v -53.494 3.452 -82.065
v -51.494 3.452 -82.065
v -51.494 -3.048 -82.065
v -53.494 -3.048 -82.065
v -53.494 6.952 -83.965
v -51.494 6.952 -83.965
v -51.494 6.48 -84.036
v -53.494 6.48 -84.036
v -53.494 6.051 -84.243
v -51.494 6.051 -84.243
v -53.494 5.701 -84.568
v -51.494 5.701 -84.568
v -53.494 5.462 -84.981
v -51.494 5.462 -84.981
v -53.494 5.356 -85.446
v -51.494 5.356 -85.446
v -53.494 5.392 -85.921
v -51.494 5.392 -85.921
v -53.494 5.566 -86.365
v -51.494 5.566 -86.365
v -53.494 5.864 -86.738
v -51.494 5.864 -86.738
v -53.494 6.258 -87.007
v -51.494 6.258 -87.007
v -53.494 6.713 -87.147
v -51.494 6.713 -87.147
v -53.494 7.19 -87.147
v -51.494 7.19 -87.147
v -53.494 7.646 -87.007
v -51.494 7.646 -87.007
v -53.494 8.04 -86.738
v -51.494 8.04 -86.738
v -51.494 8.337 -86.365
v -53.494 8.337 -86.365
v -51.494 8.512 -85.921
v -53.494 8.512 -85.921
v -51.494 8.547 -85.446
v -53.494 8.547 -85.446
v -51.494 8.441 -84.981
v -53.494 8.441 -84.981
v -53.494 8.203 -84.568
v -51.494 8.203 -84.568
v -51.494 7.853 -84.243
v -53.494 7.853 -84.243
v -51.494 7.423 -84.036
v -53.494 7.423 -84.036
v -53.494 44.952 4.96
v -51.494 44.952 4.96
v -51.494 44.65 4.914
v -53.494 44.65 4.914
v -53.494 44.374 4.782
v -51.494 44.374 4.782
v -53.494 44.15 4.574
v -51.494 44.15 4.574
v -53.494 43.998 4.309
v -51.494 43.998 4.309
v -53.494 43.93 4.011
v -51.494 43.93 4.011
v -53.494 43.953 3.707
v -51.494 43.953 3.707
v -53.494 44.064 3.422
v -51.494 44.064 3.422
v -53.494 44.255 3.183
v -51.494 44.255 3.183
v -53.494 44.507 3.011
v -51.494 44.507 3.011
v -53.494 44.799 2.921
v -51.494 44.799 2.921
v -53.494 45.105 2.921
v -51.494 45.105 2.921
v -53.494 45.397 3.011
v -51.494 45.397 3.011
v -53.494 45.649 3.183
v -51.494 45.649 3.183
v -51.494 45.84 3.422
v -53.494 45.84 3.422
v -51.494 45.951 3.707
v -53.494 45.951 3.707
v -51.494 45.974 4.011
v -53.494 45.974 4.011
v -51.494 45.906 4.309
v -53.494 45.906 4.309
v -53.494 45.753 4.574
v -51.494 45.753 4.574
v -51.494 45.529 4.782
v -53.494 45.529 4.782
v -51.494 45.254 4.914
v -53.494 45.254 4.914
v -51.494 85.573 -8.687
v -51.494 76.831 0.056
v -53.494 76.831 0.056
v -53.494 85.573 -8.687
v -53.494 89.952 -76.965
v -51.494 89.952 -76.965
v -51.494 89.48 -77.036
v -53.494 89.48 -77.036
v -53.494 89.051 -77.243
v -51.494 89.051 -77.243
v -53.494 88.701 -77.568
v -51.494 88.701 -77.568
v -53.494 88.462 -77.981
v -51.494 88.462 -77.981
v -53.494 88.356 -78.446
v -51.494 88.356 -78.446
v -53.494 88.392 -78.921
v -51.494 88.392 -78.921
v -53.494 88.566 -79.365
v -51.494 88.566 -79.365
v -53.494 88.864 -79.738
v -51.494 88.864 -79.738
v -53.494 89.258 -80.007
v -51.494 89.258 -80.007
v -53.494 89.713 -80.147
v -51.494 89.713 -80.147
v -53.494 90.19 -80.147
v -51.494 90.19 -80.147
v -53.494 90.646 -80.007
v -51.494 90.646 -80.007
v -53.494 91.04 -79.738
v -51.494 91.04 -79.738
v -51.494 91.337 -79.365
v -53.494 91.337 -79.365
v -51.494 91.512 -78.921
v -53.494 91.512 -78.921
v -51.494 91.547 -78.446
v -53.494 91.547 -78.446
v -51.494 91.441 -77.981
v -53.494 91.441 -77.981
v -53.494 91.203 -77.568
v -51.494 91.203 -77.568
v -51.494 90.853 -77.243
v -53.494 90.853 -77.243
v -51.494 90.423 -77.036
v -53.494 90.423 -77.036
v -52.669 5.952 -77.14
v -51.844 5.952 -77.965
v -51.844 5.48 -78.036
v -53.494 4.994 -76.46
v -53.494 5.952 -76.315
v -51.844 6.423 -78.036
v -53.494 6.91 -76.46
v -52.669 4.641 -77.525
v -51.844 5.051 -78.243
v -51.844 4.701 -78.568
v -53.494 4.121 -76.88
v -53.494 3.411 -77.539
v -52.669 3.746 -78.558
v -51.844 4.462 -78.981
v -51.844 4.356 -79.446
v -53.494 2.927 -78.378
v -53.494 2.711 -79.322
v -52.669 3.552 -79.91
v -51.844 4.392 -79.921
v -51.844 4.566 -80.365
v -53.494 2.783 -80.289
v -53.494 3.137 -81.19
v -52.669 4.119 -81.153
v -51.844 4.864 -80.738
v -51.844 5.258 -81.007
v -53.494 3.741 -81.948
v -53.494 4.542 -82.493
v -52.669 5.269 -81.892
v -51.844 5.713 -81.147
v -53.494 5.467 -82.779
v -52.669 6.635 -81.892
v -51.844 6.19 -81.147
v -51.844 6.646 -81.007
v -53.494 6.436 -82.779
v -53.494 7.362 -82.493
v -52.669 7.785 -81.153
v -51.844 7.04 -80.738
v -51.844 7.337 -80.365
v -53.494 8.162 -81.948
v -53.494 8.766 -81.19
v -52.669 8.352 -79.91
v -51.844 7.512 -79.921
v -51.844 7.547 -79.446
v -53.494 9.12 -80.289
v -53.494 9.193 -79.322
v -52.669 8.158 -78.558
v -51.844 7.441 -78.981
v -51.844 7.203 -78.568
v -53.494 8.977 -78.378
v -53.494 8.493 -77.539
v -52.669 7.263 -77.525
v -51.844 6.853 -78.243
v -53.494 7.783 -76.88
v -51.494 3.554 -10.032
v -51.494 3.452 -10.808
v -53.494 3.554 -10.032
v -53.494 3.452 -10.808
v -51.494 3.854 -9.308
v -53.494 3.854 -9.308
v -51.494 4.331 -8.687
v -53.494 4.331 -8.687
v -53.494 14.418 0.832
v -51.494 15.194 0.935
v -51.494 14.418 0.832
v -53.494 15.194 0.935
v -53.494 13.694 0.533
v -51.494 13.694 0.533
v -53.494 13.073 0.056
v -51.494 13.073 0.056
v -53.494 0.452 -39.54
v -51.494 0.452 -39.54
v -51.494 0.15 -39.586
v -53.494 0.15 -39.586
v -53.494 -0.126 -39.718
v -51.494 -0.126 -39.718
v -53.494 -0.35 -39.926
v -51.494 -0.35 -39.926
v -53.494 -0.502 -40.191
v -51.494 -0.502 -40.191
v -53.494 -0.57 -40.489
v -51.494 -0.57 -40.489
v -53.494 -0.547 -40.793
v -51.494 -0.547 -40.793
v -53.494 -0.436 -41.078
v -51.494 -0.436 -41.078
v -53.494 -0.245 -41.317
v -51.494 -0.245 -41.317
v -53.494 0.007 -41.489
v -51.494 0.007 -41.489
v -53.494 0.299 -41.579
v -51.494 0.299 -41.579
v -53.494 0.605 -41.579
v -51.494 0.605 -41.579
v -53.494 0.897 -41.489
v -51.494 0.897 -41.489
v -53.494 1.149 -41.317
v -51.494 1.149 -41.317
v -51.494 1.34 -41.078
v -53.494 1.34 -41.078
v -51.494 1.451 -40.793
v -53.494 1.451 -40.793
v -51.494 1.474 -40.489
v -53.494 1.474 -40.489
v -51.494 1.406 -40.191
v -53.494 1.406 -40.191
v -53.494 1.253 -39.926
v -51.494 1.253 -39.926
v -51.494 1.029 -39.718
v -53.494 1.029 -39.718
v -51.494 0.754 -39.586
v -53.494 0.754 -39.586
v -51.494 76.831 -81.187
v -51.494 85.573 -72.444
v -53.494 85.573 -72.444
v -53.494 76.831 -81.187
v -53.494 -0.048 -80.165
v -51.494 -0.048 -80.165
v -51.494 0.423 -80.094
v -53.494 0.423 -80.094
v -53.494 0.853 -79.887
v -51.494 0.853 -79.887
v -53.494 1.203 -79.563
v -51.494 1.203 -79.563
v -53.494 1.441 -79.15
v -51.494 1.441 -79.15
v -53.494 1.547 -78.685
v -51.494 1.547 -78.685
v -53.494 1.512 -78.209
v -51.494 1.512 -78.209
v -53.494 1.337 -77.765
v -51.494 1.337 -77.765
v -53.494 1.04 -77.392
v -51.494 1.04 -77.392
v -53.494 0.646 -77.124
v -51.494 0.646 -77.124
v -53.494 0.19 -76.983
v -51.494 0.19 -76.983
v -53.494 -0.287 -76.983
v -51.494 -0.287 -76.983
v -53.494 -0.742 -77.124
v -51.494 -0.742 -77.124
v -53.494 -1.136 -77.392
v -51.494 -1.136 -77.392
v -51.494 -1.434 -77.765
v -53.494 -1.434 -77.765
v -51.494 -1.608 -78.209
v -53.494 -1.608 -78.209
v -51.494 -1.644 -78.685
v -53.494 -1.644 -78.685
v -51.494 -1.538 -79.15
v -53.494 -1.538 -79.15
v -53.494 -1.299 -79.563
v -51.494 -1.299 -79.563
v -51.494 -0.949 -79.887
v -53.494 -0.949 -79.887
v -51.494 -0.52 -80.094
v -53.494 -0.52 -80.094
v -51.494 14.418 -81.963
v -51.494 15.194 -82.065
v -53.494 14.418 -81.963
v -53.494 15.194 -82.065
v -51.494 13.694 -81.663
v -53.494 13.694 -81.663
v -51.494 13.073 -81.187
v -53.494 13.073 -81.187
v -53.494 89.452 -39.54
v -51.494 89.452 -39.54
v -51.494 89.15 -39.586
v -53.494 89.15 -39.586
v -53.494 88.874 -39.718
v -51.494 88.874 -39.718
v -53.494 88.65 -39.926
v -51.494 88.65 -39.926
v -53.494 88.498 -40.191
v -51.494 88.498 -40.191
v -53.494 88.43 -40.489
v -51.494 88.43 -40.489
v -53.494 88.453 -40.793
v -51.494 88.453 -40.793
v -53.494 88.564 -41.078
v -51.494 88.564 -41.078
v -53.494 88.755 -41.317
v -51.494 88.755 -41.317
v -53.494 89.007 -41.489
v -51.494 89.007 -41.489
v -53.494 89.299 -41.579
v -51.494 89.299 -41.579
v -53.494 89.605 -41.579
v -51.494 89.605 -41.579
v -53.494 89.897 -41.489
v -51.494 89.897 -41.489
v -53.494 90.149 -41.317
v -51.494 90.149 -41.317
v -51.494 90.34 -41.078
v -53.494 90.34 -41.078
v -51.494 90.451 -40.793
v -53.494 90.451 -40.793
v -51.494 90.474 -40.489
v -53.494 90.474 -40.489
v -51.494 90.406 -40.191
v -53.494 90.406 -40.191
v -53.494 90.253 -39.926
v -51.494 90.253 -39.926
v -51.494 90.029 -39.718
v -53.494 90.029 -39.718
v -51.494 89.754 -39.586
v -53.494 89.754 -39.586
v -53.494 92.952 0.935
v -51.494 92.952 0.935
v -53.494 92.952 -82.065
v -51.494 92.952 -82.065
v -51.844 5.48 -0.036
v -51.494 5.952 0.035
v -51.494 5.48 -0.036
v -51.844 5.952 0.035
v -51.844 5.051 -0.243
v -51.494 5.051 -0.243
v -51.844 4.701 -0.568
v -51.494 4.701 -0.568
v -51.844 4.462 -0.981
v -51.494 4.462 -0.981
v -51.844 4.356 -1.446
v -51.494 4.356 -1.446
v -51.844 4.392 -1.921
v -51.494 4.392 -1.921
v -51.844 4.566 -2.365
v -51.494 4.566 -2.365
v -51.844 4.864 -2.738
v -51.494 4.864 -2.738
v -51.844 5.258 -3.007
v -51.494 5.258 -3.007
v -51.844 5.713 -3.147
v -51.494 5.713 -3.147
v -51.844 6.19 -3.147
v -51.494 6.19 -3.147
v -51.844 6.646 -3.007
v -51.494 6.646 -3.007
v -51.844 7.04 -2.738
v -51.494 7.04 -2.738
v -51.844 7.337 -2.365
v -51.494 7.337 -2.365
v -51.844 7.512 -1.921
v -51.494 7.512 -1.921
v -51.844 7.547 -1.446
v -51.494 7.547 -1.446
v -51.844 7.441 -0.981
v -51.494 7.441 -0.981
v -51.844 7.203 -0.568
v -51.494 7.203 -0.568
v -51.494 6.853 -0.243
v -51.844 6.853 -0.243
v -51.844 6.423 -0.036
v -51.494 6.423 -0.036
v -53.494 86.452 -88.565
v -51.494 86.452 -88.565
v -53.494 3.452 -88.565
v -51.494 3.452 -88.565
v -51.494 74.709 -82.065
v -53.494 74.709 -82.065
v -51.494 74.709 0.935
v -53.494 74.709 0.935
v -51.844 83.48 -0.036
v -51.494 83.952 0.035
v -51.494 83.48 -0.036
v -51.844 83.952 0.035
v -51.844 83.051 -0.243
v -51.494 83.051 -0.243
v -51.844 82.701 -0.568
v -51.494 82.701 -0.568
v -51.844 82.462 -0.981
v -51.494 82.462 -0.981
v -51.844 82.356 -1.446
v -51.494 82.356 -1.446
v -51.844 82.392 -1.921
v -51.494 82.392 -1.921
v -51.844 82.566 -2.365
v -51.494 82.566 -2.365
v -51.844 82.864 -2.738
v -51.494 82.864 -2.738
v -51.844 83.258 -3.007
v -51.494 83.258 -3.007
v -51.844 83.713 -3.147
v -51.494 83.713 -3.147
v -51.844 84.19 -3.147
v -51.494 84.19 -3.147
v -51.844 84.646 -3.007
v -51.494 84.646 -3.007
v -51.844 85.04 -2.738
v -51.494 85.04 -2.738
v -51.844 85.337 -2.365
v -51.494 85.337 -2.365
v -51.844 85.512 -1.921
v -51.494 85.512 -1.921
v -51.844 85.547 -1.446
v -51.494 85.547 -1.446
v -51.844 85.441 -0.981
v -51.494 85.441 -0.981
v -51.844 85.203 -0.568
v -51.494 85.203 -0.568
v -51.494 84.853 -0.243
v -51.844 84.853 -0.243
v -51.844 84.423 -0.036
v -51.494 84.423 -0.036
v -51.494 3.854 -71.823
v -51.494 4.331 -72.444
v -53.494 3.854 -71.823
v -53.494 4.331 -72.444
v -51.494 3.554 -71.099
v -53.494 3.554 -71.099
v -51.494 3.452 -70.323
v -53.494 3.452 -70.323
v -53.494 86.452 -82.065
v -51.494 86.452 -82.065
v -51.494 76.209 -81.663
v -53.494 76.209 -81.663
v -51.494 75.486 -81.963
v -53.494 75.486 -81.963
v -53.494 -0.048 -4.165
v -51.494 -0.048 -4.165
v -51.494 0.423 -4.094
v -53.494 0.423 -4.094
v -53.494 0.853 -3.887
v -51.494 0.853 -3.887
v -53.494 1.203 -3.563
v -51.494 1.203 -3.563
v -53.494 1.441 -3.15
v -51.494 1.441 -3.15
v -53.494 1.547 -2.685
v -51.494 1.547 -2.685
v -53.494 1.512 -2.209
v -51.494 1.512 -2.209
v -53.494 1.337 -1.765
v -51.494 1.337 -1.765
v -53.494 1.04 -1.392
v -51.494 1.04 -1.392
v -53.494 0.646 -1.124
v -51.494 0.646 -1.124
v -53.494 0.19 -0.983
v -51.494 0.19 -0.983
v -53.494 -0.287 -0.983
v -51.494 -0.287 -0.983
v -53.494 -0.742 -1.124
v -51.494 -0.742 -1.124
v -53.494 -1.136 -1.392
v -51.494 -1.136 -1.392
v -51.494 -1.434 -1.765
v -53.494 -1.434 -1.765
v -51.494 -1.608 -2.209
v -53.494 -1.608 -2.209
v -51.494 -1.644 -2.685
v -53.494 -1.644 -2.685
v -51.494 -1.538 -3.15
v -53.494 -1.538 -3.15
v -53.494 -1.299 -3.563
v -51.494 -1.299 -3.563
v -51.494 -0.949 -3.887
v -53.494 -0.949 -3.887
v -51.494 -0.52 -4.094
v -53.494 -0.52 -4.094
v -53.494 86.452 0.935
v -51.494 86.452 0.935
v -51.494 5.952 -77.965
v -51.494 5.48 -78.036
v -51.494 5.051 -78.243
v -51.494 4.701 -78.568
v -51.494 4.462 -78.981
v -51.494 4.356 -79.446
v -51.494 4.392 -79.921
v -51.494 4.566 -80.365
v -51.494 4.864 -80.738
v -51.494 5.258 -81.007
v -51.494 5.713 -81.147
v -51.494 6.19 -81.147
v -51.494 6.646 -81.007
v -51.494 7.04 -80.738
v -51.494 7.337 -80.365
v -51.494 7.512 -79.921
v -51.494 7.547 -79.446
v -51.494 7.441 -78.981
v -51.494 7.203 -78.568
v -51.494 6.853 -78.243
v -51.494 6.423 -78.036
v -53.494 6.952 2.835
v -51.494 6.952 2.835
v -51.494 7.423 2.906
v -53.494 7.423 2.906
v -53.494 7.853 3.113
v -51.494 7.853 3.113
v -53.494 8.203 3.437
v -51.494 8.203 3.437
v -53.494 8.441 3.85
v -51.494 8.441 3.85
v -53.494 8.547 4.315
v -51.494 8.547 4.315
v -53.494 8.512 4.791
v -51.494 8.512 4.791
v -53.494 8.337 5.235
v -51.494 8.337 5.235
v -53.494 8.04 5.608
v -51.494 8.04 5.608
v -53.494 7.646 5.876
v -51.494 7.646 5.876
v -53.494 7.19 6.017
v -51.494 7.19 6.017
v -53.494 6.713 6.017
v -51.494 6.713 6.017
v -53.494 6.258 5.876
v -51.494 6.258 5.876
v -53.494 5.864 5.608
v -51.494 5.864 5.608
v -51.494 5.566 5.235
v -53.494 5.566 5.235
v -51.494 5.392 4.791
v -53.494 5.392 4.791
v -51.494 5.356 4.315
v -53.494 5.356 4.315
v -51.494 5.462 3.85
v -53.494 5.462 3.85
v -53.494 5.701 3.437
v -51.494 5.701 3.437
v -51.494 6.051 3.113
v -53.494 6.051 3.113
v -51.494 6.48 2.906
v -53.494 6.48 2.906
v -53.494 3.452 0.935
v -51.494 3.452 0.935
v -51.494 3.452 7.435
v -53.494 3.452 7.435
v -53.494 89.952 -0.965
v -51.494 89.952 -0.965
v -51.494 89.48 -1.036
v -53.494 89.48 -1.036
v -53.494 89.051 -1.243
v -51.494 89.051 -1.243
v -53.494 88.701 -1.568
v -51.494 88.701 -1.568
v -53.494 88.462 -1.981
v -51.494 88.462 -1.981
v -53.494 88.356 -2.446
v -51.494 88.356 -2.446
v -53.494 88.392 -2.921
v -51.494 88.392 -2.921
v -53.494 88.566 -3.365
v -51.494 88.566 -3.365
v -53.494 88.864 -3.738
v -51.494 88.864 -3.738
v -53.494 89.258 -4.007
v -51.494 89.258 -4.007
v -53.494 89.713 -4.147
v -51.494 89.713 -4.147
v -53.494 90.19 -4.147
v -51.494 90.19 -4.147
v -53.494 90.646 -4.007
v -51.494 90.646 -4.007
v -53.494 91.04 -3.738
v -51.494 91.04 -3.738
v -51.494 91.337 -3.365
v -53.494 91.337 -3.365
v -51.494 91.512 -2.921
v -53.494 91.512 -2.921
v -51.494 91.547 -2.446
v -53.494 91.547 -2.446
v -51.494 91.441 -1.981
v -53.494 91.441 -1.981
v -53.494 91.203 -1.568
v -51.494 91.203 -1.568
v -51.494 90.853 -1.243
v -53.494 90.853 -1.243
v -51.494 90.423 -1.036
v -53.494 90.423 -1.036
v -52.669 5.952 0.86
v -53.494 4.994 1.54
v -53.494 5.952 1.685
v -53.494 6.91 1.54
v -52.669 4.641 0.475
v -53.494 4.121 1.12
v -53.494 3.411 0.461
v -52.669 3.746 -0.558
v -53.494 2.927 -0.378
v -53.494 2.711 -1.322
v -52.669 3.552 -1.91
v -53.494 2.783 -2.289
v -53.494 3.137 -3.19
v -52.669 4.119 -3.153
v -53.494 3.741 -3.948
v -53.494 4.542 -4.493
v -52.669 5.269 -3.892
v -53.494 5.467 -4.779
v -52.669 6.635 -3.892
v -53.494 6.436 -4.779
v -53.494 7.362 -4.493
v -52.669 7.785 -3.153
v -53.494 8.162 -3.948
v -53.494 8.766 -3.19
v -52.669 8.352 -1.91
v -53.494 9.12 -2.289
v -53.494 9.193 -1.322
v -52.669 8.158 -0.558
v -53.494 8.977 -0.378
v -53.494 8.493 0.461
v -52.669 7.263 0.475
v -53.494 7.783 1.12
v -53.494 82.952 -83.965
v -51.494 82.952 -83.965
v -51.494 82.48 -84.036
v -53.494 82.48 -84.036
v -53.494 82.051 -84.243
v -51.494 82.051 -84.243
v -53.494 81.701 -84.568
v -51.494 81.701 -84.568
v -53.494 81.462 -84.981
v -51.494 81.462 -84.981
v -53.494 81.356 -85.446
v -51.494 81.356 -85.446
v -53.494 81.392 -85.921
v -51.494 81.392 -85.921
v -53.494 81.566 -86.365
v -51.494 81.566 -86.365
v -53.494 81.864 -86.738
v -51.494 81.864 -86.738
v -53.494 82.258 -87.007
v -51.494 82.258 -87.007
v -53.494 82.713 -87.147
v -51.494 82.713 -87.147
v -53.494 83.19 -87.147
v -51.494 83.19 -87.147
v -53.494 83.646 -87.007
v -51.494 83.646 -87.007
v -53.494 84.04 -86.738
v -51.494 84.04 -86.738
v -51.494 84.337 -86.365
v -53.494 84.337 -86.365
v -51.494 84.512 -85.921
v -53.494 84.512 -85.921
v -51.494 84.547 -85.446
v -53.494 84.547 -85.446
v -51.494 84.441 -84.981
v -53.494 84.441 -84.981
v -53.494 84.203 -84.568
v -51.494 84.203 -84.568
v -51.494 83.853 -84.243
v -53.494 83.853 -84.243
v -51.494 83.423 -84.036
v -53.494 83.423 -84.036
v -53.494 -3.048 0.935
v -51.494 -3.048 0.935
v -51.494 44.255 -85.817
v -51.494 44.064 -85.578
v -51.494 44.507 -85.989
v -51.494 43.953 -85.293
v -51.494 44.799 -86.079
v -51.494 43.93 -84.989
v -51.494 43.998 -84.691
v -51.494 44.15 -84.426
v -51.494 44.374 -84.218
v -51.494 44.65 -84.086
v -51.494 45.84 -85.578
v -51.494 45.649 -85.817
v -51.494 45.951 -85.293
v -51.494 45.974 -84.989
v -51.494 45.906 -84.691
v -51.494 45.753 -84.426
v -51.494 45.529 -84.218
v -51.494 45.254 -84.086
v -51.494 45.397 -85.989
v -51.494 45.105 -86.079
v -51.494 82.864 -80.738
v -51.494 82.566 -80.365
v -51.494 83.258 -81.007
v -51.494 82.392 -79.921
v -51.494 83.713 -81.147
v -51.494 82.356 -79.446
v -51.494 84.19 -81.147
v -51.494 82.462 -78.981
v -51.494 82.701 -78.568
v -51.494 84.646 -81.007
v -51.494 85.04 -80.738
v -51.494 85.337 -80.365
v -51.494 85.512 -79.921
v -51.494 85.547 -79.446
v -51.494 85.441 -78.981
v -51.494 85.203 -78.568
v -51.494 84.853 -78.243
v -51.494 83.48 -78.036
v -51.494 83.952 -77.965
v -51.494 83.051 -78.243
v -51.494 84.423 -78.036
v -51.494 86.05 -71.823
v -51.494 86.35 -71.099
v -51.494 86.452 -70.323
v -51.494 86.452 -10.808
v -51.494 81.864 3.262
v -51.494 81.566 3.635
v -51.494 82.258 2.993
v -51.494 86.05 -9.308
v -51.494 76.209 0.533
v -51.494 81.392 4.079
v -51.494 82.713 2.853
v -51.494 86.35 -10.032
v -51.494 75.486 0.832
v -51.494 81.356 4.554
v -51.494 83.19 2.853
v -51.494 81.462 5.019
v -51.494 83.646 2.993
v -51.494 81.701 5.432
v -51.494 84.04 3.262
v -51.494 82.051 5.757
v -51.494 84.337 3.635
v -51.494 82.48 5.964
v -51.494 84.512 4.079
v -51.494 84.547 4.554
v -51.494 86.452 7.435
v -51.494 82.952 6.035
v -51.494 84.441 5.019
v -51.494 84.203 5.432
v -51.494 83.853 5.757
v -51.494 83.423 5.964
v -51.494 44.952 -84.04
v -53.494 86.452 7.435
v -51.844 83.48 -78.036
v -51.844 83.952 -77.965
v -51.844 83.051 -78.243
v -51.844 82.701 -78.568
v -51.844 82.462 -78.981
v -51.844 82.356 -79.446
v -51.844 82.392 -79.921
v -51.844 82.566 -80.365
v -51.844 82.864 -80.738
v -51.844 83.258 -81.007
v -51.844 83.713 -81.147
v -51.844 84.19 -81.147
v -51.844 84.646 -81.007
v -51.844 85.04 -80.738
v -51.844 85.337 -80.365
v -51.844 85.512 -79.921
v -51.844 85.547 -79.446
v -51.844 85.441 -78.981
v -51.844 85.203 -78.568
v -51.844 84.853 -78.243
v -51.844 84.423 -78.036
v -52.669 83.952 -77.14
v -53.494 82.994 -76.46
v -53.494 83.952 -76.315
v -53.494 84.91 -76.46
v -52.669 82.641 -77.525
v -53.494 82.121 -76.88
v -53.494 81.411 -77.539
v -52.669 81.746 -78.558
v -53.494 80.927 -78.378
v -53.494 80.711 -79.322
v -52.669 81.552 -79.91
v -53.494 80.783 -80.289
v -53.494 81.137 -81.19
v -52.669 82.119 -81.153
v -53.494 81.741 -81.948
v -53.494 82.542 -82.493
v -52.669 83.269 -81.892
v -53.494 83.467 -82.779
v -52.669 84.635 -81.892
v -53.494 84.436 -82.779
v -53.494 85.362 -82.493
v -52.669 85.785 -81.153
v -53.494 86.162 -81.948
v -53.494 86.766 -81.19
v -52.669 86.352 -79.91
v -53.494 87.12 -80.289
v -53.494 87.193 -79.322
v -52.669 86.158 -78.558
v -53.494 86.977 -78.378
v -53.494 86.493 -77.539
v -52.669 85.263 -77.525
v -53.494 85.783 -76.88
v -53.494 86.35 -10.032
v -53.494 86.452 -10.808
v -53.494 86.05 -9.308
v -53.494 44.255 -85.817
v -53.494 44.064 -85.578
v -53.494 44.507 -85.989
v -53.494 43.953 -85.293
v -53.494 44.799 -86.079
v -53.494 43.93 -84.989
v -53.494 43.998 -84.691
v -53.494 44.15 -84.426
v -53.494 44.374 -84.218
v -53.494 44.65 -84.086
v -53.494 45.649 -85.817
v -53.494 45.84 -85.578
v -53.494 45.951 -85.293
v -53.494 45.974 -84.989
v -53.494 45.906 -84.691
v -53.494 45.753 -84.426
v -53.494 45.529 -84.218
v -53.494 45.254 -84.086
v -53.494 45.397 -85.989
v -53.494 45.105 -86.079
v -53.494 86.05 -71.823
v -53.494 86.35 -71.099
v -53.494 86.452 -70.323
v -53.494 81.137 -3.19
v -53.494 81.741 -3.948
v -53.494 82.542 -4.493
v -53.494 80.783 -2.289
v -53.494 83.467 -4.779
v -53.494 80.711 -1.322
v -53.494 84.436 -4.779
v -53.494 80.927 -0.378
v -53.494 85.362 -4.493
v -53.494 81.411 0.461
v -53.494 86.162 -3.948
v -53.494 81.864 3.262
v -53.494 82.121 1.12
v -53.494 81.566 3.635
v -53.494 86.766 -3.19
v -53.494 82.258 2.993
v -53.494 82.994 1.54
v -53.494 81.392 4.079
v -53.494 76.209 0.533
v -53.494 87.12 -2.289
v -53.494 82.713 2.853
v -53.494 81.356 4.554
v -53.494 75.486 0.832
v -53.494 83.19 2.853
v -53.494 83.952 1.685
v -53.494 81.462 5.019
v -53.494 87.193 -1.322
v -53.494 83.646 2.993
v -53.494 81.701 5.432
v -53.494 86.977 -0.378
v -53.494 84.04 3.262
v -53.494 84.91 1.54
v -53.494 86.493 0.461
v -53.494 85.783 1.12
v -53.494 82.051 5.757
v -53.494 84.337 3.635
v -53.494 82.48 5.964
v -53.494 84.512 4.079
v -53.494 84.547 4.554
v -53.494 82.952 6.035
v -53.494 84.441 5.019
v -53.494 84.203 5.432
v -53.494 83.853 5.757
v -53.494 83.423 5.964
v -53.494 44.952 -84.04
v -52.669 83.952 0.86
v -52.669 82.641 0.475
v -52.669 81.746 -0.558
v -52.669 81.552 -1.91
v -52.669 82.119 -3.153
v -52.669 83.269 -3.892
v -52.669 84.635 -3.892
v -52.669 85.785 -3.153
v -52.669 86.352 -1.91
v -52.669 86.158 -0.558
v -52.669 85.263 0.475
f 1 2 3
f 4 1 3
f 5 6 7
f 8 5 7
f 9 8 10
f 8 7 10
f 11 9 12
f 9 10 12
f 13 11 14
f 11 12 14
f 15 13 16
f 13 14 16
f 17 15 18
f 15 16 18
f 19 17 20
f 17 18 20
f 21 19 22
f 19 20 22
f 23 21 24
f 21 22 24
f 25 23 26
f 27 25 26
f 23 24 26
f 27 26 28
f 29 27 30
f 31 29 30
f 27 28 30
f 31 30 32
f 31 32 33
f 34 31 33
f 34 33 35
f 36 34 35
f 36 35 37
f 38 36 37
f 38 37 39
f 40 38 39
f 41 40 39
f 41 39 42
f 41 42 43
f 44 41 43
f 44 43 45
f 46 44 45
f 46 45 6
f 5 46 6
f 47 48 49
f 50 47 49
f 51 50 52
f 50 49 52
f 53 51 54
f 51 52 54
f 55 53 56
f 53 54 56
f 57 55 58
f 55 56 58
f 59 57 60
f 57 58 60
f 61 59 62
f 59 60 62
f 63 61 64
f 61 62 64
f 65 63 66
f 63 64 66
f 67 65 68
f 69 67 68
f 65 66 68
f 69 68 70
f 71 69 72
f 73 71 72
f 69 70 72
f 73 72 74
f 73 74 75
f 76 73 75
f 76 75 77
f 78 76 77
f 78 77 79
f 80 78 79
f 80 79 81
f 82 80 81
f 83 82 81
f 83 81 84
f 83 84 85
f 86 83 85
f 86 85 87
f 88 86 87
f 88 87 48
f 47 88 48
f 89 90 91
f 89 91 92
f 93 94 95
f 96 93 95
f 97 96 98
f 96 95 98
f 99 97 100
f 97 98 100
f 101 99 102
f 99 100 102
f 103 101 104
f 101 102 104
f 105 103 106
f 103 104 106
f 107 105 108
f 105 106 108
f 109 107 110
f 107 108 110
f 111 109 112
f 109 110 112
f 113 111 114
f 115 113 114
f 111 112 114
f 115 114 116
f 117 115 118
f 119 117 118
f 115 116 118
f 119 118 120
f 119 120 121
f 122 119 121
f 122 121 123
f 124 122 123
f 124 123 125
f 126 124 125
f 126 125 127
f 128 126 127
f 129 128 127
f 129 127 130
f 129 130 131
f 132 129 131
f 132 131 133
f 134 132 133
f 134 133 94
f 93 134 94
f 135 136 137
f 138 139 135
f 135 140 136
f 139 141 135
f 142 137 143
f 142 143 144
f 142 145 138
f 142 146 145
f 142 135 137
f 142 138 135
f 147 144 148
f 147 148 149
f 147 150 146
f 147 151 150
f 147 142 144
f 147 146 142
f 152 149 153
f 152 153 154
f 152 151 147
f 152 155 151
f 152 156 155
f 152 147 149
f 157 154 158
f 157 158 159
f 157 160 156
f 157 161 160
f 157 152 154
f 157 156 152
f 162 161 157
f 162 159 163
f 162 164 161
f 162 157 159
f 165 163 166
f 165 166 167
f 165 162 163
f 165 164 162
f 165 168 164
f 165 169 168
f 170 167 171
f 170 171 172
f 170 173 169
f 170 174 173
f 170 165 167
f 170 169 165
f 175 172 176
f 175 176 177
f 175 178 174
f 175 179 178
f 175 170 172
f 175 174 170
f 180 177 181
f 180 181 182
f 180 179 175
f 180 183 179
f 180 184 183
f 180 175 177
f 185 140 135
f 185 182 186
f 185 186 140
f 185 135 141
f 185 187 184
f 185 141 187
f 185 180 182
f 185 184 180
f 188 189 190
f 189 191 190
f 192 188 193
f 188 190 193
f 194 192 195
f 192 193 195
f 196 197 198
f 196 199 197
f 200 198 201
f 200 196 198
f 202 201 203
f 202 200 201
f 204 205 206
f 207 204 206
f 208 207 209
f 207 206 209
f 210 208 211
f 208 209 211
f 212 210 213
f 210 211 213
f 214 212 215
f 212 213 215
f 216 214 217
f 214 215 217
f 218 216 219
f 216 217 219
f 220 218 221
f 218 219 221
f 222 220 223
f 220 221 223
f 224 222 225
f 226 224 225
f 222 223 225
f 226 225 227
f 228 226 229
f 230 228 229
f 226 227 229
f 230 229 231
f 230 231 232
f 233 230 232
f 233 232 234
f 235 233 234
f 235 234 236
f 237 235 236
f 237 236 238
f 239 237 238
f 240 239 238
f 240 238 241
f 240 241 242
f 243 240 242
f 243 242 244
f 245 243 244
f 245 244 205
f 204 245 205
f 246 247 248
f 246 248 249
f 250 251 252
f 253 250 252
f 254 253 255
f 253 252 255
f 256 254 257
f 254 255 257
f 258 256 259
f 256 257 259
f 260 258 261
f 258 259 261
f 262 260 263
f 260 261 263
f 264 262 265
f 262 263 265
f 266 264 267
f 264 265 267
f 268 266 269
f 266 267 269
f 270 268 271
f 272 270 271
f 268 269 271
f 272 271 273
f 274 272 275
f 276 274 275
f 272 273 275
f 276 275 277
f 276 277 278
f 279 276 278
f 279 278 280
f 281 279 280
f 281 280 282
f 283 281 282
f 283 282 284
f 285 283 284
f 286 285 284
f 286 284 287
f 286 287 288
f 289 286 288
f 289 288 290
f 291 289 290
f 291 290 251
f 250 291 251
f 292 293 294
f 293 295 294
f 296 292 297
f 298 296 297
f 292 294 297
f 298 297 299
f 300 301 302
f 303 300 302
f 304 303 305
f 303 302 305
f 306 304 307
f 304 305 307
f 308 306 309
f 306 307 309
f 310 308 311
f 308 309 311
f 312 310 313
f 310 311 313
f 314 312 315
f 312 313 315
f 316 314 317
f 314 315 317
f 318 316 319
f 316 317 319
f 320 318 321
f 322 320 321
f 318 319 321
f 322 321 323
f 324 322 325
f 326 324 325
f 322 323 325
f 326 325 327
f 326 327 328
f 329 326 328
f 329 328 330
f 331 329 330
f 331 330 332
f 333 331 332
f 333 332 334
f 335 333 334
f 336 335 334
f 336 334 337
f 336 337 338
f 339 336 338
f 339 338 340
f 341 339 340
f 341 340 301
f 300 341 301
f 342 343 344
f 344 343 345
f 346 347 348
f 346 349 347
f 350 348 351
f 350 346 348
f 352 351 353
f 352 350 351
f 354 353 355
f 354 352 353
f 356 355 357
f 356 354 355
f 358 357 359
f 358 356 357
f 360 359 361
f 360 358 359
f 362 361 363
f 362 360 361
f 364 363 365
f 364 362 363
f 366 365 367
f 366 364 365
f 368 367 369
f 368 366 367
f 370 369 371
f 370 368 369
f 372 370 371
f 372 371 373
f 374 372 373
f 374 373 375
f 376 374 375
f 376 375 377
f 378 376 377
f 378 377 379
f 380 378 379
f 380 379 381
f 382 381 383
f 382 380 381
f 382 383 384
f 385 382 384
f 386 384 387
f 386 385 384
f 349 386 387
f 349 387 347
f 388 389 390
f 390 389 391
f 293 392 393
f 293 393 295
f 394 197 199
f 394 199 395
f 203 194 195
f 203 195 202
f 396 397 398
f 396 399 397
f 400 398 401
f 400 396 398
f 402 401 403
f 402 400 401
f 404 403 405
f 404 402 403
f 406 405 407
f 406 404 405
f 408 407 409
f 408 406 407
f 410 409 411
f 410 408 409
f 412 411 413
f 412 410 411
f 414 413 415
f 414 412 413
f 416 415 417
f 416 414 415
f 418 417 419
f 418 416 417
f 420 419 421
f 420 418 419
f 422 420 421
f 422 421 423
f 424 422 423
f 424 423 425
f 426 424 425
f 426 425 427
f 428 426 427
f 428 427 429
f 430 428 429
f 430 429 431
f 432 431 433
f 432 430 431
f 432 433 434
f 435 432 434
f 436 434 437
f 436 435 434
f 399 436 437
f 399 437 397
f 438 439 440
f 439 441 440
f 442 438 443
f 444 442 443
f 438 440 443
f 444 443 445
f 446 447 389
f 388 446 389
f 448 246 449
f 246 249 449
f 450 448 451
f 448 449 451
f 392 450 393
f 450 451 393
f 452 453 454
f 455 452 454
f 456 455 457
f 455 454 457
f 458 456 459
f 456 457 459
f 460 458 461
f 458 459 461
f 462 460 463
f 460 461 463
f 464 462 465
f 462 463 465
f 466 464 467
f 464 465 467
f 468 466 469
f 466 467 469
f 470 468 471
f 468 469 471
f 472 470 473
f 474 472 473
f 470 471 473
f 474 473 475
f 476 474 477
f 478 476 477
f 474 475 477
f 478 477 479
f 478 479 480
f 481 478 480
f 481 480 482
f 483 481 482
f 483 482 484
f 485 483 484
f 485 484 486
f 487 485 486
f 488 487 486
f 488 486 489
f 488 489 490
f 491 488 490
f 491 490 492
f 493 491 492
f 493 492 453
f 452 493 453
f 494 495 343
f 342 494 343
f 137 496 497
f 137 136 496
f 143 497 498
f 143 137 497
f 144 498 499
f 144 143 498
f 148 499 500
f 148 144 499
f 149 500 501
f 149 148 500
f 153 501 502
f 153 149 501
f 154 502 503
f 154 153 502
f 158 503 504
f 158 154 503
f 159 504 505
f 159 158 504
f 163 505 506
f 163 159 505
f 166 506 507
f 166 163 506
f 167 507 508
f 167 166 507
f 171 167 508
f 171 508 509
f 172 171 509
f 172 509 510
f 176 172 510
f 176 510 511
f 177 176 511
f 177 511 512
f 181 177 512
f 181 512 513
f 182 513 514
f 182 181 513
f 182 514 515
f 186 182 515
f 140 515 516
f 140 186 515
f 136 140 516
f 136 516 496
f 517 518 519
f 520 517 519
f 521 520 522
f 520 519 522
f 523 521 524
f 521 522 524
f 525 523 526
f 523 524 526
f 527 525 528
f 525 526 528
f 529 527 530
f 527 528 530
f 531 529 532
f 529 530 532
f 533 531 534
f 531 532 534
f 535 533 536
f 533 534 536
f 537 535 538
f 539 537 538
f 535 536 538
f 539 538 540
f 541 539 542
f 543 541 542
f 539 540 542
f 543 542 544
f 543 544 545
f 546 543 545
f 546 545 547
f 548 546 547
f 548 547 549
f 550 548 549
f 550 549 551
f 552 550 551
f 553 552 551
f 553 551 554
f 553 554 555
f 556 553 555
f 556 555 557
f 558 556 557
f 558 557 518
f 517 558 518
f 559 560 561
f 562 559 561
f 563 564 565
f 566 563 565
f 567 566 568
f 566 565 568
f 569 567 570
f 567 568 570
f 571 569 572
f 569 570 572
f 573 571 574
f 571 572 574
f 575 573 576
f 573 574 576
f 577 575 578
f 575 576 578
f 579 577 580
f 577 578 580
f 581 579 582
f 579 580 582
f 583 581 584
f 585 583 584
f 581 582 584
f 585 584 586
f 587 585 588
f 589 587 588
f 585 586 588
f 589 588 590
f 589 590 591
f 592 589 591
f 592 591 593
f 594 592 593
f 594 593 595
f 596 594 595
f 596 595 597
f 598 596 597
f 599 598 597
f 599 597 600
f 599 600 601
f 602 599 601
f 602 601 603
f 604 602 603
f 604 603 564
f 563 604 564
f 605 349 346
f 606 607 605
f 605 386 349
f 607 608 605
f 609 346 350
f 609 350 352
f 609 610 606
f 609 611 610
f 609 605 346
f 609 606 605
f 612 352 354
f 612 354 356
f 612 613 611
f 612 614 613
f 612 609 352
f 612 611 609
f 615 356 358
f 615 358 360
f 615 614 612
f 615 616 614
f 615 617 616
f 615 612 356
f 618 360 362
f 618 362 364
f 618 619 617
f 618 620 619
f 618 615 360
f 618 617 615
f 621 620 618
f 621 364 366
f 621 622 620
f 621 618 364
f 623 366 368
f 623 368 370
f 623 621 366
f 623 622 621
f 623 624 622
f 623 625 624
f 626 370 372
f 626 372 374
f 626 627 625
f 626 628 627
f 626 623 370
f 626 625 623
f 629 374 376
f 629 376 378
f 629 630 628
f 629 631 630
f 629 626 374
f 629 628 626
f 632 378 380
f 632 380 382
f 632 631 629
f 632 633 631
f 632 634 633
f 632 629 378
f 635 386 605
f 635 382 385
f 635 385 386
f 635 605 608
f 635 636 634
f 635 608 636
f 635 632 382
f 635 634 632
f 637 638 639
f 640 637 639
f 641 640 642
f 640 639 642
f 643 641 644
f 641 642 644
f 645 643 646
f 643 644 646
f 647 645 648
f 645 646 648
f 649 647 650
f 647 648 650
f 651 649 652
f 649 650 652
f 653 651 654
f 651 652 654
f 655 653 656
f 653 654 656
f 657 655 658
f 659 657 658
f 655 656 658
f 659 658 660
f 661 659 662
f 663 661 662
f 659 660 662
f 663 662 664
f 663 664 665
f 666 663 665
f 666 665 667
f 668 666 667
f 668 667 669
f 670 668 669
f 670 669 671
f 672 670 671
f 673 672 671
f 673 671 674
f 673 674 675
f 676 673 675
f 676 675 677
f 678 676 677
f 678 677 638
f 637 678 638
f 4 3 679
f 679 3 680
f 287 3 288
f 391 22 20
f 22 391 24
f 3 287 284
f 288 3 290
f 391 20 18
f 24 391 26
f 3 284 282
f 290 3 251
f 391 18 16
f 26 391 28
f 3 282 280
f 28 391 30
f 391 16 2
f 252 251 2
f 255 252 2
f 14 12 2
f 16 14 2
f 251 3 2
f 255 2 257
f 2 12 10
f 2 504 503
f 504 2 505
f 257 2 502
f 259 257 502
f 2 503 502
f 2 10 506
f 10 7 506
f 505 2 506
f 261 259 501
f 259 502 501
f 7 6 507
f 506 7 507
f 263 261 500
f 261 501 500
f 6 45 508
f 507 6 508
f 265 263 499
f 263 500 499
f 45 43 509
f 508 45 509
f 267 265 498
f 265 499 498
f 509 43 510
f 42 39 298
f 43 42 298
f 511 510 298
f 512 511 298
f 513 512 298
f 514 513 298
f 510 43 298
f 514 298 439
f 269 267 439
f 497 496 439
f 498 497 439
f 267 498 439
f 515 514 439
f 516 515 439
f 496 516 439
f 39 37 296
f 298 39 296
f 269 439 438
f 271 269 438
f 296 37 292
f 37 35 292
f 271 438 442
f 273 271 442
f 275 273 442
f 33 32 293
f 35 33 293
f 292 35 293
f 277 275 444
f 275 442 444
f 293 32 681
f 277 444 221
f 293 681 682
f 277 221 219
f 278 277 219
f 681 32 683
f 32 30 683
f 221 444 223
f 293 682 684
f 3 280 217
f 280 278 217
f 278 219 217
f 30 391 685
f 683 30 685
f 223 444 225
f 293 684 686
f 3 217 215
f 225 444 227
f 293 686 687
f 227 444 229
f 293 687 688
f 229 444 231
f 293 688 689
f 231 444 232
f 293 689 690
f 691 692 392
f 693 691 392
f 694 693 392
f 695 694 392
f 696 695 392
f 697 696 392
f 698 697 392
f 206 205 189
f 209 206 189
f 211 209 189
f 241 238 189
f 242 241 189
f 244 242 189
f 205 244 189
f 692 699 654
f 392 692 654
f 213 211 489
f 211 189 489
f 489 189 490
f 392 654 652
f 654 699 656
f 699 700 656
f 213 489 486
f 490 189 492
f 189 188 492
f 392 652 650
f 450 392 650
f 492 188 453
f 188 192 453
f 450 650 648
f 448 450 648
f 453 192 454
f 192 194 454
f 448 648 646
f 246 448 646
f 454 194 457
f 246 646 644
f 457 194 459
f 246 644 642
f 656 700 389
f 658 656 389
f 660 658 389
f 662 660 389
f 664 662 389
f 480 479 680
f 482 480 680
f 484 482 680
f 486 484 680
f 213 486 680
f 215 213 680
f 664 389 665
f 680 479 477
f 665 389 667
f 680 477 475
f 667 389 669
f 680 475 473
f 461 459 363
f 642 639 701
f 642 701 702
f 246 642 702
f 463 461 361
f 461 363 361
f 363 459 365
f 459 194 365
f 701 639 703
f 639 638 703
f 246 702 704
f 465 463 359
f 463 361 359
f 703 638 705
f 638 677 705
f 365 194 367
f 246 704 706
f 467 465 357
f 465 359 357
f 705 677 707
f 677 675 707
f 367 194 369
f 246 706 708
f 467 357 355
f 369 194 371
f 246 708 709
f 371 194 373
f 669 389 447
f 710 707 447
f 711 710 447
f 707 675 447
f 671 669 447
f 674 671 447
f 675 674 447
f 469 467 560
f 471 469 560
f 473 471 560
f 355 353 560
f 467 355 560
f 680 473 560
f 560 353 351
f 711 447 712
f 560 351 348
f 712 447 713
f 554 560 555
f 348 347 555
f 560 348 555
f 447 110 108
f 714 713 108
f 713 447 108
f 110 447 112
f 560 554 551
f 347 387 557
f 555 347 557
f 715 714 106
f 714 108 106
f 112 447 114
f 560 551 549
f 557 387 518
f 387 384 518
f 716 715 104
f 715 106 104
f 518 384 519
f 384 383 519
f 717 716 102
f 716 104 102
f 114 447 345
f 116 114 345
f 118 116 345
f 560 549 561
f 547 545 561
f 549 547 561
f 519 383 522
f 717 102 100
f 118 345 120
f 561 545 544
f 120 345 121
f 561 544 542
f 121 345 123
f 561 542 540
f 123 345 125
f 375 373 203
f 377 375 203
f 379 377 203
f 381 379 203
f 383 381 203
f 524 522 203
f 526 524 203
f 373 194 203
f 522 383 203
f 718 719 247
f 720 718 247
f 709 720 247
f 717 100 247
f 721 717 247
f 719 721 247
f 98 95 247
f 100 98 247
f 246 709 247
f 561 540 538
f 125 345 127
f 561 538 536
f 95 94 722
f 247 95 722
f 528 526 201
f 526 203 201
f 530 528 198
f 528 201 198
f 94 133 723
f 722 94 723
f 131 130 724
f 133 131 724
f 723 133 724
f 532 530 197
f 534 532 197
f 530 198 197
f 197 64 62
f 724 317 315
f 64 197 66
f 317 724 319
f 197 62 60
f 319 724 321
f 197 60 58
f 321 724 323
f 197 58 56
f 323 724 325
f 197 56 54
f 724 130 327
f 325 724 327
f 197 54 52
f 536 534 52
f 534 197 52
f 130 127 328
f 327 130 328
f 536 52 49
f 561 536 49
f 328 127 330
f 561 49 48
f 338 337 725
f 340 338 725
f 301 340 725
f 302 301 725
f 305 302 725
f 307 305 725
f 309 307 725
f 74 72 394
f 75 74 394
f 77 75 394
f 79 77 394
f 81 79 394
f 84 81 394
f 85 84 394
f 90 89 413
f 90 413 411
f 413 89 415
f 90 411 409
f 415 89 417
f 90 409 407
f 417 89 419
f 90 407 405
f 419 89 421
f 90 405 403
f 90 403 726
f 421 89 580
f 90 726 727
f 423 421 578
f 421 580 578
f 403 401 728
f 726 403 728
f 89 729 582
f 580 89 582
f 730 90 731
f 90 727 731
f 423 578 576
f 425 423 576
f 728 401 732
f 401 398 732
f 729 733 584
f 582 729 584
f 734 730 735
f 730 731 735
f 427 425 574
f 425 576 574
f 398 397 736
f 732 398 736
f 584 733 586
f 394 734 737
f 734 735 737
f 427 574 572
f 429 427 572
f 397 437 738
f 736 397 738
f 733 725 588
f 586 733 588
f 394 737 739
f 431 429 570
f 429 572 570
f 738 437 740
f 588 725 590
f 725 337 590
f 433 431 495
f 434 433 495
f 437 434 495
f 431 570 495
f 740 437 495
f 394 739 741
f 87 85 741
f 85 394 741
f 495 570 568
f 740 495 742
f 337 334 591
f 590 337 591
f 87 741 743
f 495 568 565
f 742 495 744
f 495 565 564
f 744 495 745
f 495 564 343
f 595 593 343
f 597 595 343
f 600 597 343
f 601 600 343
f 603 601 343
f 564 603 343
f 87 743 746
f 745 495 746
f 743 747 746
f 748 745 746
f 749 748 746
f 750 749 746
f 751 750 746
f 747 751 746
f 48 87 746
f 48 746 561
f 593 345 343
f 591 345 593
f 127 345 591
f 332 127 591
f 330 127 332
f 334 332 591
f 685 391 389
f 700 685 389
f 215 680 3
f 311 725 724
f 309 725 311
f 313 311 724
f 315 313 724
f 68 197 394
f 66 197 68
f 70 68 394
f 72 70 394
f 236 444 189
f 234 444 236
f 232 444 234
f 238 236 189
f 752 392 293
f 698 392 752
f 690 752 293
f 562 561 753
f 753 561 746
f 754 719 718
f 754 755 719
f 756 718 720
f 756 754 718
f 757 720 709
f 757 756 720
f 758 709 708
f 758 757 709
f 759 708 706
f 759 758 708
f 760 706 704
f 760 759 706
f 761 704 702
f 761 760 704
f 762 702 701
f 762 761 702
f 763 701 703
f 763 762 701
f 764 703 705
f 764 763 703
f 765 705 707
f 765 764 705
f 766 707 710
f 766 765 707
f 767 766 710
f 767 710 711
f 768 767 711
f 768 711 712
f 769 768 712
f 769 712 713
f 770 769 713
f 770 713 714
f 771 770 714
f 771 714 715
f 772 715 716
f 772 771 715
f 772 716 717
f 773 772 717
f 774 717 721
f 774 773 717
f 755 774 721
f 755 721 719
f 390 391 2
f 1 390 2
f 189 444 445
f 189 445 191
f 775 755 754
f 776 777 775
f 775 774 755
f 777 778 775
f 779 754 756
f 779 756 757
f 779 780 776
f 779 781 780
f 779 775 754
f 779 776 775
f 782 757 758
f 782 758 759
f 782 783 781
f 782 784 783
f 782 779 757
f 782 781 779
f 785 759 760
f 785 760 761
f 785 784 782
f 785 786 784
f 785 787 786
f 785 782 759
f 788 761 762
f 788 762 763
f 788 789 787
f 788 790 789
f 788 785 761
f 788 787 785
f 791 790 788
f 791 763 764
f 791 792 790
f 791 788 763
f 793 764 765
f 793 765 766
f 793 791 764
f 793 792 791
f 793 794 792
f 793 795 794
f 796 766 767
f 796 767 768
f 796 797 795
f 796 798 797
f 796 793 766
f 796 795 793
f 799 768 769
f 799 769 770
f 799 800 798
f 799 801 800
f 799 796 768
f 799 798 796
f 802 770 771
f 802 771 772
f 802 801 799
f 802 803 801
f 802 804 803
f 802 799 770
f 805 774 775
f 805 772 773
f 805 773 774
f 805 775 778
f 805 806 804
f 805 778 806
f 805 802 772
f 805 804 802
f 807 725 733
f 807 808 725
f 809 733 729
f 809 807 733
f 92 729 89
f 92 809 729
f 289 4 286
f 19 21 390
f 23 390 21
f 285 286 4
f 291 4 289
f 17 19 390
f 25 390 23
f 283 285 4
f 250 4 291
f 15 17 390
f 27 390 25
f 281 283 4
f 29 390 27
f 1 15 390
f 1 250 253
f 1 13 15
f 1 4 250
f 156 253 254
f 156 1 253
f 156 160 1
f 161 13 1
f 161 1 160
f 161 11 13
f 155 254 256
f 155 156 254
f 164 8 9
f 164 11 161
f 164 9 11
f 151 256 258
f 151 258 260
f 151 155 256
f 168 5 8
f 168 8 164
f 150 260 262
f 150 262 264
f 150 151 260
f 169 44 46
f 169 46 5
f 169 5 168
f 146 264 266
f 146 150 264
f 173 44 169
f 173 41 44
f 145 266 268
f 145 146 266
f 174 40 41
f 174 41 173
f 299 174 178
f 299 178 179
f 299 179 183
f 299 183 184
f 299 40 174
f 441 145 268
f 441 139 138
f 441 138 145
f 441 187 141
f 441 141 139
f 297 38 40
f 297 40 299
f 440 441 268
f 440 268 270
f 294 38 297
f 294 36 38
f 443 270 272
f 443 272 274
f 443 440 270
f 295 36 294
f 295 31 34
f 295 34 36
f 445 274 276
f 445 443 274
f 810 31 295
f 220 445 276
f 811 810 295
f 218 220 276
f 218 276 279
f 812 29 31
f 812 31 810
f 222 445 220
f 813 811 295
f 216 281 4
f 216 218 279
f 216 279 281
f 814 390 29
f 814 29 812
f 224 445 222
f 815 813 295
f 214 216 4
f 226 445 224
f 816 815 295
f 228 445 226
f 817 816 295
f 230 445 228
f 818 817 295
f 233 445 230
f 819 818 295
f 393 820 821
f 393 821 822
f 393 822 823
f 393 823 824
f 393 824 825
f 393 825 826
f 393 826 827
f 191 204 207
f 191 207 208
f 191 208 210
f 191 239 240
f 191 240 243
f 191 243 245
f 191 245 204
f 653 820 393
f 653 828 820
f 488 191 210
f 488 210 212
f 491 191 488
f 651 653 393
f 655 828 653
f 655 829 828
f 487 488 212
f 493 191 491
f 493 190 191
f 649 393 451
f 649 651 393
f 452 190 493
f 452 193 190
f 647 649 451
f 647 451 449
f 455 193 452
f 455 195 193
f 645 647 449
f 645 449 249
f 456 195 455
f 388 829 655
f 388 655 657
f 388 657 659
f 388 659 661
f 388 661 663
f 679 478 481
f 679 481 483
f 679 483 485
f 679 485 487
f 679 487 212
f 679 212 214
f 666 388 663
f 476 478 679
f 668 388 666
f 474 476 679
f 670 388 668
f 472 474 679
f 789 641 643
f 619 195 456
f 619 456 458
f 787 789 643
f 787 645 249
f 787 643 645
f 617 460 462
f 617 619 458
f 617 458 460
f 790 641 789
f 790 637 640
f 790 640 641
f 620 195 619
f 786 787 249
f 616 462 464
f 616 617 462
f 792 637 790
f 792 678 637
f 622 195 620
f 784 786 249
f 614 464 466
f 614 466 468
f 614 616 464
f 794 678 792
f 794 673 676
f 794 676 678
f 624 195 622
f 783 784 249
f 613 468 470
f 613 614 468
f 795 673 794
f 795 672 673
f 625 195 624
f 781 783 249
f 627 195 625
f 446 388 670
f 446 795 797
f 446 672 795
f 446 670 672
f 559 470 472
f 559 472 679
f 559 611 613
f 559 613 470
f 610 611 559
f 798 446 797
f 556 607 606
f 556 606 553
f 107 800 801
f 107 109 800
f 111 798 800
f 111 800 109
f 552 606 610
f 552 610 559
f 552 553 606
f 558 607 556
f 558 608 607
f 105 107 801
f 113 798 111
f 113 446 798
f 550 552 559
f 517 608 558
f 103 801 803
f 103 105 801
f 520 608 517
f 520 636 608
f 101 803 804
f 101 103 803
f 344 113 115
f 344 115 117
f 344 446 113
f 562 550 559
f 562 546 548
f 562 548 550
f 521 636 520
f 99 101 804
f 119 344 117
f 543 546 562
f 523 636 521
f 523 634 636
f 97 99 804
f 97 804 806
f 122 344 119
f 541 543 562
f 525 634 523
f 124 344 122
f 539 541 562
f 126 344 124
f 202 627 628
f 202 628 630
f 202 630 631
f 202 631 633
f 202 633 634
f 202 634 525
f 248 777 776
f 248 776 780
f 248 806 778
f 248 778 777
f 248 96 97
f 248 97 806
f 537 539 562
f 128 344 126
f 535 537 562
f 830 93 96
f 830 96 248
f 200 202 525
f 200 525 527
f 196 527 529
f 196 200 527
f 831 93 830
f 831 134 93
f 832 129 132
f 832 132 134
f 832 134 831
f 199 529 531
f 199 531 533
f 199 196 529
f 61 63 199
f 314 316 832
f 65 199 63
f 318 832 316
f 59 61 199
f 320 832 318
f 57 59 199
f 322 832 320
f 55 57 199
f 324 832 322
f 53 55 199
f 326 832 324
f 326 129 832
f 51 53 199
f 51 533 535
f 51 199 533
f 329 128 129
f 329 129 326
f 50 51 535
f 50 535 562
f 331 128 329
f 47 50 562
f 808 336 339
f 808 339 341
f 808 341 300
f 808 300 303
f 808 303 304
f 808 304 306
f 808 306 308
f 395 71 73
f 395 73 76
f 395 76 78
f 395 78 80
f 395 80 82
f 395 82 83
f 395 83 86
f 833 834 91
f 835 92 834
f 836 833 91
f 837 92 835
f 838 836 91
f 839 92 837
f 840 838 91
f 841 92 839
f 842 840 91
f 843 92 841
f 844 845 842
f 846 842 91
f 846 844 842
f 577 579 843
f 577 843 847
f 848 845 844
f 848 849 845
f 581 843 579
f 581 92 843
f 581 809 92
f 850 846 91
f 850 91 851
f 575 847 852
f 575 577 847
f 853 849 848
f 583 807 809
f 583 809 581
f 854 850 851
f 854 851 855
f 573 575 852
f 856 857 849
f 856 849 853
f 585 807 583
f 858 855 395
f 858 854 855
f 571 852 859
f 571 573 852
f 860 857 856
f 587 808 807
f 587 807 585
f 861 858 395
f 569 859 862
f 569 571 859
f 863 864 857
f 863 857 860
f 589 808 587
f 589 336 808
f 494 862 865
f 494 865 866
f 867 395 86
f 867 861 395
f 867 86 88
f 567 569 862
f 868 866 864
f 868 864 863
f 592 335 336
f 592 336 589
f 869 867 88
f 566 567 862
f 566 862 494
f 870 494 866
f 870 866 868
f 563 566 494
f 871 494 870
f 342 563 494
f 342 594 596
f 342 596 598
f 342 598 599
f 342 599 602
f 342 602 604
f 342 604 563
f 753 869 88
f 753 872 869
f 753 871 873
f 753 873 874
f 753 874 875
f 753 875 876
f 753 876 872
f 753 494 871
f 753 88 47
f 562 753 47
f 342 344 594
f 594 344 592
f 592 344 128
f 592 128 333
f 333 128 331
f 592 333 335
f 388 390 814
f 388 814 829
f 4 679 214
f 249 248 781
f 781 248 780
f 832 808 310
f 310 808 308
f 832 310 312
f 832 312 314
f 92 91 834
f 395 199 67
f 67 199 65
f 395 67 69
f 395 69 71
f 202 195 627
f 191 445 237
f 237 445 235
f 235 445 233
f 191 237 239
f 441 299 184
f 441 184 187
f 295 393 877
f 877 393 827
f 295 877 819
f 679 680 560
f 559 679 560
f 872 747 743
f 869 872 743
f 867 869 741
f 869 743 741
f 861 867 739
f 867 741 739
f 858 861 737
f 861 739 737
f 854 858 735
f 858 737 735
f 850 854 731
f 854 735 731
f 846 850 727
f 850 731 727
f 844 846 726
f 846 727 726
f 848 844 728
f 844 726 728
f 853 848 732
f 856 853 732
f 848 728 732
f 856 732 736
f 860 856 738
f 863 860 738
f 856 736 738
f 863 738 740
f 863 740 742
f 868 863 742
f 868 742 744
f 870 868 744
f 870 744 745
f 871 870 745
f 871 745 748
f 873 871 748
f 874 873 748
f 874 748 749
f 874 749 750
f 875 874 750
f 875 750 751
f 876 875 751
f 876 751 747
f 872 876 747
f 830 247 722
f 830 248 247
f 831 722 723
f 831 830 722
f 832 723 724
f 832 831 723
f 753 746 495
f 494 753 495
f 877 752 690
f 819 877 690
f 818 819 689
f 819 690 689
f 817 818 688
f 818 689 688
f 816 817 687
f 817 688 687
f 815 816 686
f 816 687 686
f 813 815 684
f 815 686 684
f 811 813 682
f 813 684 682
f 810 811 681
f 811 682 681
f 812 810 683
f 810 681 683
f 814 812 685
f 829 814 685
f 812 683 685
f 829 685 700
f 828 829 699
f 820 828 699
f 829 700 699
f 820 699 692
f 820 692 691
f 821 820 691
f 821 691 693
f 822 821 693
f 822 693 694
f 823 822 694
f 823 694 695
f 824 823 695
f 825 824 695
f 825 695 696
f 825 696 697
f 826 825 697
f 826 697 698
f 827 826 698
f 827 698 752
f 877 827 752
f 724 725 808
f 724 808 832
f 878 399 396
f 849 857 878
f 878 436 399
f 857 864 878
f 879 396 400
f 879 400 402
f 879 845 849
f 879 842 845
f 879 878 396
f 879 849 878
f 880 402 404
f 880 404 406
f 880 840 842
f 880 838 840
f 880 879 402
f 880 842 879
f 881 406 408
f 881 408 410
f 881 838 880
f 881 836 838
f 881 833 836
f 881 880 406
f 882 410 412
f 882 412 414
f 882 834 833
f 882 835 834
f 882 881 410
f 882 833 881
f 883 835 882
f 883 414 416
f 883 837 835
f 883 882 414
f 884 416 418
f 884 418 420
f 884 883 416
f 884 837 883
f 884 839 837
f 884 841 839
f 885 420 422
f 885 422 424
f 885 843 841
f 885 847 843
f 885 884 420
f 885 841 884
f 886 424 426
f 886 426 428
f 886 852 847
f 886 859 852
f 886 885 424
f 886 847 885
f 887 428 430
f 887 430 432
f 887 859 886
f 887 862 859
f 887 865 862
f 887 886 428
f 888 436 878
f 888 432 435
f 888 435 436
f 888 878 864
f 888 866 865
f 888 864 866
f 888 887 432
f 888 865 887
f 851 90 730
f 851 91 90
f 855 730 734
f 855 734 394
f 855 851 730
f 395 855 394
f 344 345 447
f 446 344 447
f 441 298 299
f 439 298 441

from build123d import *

# Parameters (mm, degrees)
BOSS_EXTRUDE2_DEPTH                          = 2
F_3_2_3_2_DIAMETER_HOLE1_D                   = 3.2
F_3_2_3_2_DIAMETER_HOLE2_D                   = 3.2
F_3_2_3_2_DIAMETER_HOLE3_D                   = 3.2
F_3_2_3_2_DIAMETER_HOLE5_D                   = 3.2
F_3_2_3_2_DIAMETER_HOLE5_DEPTH               = 10
F_3_2_3_2_DIAMETER_HOLE5_TIP                 = 0.96137699
CSK_FOR_M3_FLAT_COUNTERSUNK_HEAD_SCR_2_COUNT = 2
CSK_FOR_M3_FLAT_COUNTERSUNK_HEAD_SCR_2_PITCH = 78
CSK_FOR_M3_FLAT_COUNTERSUNK_HEAD_SCR_3_COUNT = 2
CSK_FOR_M3_FLAT_COUNTERSUNK_HEAD_SCR_3_PITCH = 110.308657865
FILLET1_R                                    = 3
M2_5X0_45_TAPPED_HOLE1_D                     = 2.05


with BuildPart() as part:
    # Sketch2 → Boss-Extrude2 (new body)
    with BuildSketch(Plane.ZY.offset(51.493641502)):
        Polygon((0.93465612, 3.45185693), (7.43465612, 3.45185693), (7.43465612, 86.45185693), (0.93465612, 86.45185693), (0.93465612, 92.95185693), (-82.06534388, 92.95185693), (-82.06534388, 86.45185693), (-88.56534388, 86.45185693), (-88.56534388, 3.45185693), (-82.06534388, 3.45185693), (-82.06534388, -3.04814307), (0.93465612, -3.04814307), align=None)
        Polygon((-71.56534388, 86.45185693), (-82.06534388, 75.95185693), (-82.06534388, 13.95185693), (-71.56534388, 3.45185693), (-9.56534388, 3.45185693), (0.93465612, 13.95185693), (0.93465612, 75.95185693), (-9.56534388, 86.45185693), align=None, mode=Mode.SUBTRACT)
    extrude(amount=BOSS_EXTRUDE2_DEPTH)

    # Sketch10 → CSK for M3 Flat Countersunk Head Screw3 (revolve, cut)
    with BuildSketch(Plane(origin=(-53.493641502, 5.95185693, -1.56534388), x_dir=(0, 0, 1), z_dir=(0, 1, 0))):
        Polygon((0, 0), (0, 2), (1.6, 2), (1.6, 1.65), (3.25, 0), align=None)
    revolve(axis=Axis((-59.843641502, 5.95185693, -1.56534388), (1, 0, 0)), mode=Mode.SUBTRACT)

    # Ø3.2 (3.2) Diameter Hole1 (through all)
    with Locations(Plane.ZY.offset(53.493641502)):
        with Locations((4.43465612, 6.95185693)):
            Hole(F_3_2_3_2_DIAMETER_HOLE1_D / 2)

    # Ø3.2 (3.2) Diameter Hole2 (through all)
    with Locations(Plane.ZY.offset(53.493641502)):
        with Locations((-2.56534388, -0.04814307)):
            Hole(F_3_2_3_2_DIAMETER_HOLE2_D / 2)

    # Ø3.2 (3.2) Diameter Hole3 (through all)
    with Locations(Plane.ZY.offset(53.493641502)):
        with Locations((-78.56534388, -0.04814307)):
            Hole(F_3_2_3_2_DIAMETER_HOLE3_D / 2)

    # Ø3.2 (3.2) Diameter Hole5
    with Locations(Plane(origin=(-53.493641502, 6.95185693, -85.56534388), x_dir=(0, 0, -1), z_dir=(-1, 0, 0))):
        with Locations((0, 0), (0, -76), (-7, -83), (-83, -83), (-90, -76)):
            Hole(F_3_2_3_2_DIAMETER_HOLE5_D / 2, depth=F_3_2_3_2_DIAMETER_HOLE5_DEPTH)
            with Locations((0, 0, -(F_3_2_3_2_DIAMETER_HOLE5_DEPTH + F_3_2_3_2_DIAMETER_HOLE5_TIP / 2))):  # 118° drill point
                Cone(0, F_3_2_3_2_DIAMETER_HOLE5_D / 2, F_3_2_3_2_DIAMETER_HOLE5_TIP, mode=Mode.SUBTRACT)

    # Sketch24 → CSK for M3 Flat Countersunk Head Screw5 (revolve, cut)
    with BuildSketch(Plane(origin=(-53.493641502, 5.95185693, -79.56534388), x_dir=(0, 0, 1), z_dir=(0, 1, 0))):
        Polygon((0, 0), (0, 2), (1.6, 2), (1.6, 1.65), (3.25, 0), align=None)
    csk_for_m3_flat_countersunk_head_screw5 = revolve(axis=Axis((-59.843641502, 5.95185693, -79.56534388), (1, 0, 0)), mode=Mode.SUBTRACT)

    # CSK for M3 Flat Countersunk Head Scr 2: CSK for M3 Flat Countersunk Head Screw5 ×2
    with Locations(*[(0, i * CSK_FOR_M3_FLAT_COUNTERSUNK_HEAD_SCR_2_PITCH, 0) for i in range(1, CSK_FOR_M3_FLAT_COUNTERSUNK_HEAD_SCR_2_COUNT)]):
        add(csk_for_m3_flat_countersunk_head_screw5, mode=Mode.SUBTRACT)

    # CSK for M3 Flat Countersunk Head Scr 3: CSK for M3 Flat Countersunk Head Screw5 ×2
    with Locations(*[Vector(0, 0.7071067811865477, 0.7071067811865474) * (i * CSK_FOR_M3_FLAT_COUNTERSUNK_HEAD_SCR_3_PITCH) for i in range(1, CSK_FOR_M3_FLAT_COUNTERSUNK_HEAD_SCR_3_COUNT)]):
        add(csk_for_m3_flat_countersunk_head_screw5, mode=Mode.SUBTRACT)

    # Fillet1
    fillet1_edges = [part.edges().sort_by_distance(p)[0] for p in [
        (-52.493641502, 86.45185693, -9.56534388),
        (-52.493641502, 86.45185693, -71.56534388),
        (-52.493641502, 75.95185693, -82.06534388),
        (-52.493641502, 13.95185693, -82.06534388),
        (-52.493641502, 3.45185693, -71.56534388),
        (-52.493641502, 3.45185693, -9.56534388),
        (-52.493641502, 13.95185693, 0.93465612),
        (-52.493641502, 75.95185693, 0.93465612),
    ]]
    fillet(fillet1_edges, radius=FILLET1_R)

    # M2.5x0.45 Tapped Hole1 (through all)
    with Locations(Plane(origin=(-53.493641502, 89.45185693, -40.56534388), x_dir=(0, 0, -1), z_dir=(-1, 0, 0))):
        with Locations((0, 0), (44.5, 44.5), (0, 89), (-44.5, 44.5)):
            Hole(M2_5X0_45_TAPPED_HOLE1_D / 2)


solid = part.part
